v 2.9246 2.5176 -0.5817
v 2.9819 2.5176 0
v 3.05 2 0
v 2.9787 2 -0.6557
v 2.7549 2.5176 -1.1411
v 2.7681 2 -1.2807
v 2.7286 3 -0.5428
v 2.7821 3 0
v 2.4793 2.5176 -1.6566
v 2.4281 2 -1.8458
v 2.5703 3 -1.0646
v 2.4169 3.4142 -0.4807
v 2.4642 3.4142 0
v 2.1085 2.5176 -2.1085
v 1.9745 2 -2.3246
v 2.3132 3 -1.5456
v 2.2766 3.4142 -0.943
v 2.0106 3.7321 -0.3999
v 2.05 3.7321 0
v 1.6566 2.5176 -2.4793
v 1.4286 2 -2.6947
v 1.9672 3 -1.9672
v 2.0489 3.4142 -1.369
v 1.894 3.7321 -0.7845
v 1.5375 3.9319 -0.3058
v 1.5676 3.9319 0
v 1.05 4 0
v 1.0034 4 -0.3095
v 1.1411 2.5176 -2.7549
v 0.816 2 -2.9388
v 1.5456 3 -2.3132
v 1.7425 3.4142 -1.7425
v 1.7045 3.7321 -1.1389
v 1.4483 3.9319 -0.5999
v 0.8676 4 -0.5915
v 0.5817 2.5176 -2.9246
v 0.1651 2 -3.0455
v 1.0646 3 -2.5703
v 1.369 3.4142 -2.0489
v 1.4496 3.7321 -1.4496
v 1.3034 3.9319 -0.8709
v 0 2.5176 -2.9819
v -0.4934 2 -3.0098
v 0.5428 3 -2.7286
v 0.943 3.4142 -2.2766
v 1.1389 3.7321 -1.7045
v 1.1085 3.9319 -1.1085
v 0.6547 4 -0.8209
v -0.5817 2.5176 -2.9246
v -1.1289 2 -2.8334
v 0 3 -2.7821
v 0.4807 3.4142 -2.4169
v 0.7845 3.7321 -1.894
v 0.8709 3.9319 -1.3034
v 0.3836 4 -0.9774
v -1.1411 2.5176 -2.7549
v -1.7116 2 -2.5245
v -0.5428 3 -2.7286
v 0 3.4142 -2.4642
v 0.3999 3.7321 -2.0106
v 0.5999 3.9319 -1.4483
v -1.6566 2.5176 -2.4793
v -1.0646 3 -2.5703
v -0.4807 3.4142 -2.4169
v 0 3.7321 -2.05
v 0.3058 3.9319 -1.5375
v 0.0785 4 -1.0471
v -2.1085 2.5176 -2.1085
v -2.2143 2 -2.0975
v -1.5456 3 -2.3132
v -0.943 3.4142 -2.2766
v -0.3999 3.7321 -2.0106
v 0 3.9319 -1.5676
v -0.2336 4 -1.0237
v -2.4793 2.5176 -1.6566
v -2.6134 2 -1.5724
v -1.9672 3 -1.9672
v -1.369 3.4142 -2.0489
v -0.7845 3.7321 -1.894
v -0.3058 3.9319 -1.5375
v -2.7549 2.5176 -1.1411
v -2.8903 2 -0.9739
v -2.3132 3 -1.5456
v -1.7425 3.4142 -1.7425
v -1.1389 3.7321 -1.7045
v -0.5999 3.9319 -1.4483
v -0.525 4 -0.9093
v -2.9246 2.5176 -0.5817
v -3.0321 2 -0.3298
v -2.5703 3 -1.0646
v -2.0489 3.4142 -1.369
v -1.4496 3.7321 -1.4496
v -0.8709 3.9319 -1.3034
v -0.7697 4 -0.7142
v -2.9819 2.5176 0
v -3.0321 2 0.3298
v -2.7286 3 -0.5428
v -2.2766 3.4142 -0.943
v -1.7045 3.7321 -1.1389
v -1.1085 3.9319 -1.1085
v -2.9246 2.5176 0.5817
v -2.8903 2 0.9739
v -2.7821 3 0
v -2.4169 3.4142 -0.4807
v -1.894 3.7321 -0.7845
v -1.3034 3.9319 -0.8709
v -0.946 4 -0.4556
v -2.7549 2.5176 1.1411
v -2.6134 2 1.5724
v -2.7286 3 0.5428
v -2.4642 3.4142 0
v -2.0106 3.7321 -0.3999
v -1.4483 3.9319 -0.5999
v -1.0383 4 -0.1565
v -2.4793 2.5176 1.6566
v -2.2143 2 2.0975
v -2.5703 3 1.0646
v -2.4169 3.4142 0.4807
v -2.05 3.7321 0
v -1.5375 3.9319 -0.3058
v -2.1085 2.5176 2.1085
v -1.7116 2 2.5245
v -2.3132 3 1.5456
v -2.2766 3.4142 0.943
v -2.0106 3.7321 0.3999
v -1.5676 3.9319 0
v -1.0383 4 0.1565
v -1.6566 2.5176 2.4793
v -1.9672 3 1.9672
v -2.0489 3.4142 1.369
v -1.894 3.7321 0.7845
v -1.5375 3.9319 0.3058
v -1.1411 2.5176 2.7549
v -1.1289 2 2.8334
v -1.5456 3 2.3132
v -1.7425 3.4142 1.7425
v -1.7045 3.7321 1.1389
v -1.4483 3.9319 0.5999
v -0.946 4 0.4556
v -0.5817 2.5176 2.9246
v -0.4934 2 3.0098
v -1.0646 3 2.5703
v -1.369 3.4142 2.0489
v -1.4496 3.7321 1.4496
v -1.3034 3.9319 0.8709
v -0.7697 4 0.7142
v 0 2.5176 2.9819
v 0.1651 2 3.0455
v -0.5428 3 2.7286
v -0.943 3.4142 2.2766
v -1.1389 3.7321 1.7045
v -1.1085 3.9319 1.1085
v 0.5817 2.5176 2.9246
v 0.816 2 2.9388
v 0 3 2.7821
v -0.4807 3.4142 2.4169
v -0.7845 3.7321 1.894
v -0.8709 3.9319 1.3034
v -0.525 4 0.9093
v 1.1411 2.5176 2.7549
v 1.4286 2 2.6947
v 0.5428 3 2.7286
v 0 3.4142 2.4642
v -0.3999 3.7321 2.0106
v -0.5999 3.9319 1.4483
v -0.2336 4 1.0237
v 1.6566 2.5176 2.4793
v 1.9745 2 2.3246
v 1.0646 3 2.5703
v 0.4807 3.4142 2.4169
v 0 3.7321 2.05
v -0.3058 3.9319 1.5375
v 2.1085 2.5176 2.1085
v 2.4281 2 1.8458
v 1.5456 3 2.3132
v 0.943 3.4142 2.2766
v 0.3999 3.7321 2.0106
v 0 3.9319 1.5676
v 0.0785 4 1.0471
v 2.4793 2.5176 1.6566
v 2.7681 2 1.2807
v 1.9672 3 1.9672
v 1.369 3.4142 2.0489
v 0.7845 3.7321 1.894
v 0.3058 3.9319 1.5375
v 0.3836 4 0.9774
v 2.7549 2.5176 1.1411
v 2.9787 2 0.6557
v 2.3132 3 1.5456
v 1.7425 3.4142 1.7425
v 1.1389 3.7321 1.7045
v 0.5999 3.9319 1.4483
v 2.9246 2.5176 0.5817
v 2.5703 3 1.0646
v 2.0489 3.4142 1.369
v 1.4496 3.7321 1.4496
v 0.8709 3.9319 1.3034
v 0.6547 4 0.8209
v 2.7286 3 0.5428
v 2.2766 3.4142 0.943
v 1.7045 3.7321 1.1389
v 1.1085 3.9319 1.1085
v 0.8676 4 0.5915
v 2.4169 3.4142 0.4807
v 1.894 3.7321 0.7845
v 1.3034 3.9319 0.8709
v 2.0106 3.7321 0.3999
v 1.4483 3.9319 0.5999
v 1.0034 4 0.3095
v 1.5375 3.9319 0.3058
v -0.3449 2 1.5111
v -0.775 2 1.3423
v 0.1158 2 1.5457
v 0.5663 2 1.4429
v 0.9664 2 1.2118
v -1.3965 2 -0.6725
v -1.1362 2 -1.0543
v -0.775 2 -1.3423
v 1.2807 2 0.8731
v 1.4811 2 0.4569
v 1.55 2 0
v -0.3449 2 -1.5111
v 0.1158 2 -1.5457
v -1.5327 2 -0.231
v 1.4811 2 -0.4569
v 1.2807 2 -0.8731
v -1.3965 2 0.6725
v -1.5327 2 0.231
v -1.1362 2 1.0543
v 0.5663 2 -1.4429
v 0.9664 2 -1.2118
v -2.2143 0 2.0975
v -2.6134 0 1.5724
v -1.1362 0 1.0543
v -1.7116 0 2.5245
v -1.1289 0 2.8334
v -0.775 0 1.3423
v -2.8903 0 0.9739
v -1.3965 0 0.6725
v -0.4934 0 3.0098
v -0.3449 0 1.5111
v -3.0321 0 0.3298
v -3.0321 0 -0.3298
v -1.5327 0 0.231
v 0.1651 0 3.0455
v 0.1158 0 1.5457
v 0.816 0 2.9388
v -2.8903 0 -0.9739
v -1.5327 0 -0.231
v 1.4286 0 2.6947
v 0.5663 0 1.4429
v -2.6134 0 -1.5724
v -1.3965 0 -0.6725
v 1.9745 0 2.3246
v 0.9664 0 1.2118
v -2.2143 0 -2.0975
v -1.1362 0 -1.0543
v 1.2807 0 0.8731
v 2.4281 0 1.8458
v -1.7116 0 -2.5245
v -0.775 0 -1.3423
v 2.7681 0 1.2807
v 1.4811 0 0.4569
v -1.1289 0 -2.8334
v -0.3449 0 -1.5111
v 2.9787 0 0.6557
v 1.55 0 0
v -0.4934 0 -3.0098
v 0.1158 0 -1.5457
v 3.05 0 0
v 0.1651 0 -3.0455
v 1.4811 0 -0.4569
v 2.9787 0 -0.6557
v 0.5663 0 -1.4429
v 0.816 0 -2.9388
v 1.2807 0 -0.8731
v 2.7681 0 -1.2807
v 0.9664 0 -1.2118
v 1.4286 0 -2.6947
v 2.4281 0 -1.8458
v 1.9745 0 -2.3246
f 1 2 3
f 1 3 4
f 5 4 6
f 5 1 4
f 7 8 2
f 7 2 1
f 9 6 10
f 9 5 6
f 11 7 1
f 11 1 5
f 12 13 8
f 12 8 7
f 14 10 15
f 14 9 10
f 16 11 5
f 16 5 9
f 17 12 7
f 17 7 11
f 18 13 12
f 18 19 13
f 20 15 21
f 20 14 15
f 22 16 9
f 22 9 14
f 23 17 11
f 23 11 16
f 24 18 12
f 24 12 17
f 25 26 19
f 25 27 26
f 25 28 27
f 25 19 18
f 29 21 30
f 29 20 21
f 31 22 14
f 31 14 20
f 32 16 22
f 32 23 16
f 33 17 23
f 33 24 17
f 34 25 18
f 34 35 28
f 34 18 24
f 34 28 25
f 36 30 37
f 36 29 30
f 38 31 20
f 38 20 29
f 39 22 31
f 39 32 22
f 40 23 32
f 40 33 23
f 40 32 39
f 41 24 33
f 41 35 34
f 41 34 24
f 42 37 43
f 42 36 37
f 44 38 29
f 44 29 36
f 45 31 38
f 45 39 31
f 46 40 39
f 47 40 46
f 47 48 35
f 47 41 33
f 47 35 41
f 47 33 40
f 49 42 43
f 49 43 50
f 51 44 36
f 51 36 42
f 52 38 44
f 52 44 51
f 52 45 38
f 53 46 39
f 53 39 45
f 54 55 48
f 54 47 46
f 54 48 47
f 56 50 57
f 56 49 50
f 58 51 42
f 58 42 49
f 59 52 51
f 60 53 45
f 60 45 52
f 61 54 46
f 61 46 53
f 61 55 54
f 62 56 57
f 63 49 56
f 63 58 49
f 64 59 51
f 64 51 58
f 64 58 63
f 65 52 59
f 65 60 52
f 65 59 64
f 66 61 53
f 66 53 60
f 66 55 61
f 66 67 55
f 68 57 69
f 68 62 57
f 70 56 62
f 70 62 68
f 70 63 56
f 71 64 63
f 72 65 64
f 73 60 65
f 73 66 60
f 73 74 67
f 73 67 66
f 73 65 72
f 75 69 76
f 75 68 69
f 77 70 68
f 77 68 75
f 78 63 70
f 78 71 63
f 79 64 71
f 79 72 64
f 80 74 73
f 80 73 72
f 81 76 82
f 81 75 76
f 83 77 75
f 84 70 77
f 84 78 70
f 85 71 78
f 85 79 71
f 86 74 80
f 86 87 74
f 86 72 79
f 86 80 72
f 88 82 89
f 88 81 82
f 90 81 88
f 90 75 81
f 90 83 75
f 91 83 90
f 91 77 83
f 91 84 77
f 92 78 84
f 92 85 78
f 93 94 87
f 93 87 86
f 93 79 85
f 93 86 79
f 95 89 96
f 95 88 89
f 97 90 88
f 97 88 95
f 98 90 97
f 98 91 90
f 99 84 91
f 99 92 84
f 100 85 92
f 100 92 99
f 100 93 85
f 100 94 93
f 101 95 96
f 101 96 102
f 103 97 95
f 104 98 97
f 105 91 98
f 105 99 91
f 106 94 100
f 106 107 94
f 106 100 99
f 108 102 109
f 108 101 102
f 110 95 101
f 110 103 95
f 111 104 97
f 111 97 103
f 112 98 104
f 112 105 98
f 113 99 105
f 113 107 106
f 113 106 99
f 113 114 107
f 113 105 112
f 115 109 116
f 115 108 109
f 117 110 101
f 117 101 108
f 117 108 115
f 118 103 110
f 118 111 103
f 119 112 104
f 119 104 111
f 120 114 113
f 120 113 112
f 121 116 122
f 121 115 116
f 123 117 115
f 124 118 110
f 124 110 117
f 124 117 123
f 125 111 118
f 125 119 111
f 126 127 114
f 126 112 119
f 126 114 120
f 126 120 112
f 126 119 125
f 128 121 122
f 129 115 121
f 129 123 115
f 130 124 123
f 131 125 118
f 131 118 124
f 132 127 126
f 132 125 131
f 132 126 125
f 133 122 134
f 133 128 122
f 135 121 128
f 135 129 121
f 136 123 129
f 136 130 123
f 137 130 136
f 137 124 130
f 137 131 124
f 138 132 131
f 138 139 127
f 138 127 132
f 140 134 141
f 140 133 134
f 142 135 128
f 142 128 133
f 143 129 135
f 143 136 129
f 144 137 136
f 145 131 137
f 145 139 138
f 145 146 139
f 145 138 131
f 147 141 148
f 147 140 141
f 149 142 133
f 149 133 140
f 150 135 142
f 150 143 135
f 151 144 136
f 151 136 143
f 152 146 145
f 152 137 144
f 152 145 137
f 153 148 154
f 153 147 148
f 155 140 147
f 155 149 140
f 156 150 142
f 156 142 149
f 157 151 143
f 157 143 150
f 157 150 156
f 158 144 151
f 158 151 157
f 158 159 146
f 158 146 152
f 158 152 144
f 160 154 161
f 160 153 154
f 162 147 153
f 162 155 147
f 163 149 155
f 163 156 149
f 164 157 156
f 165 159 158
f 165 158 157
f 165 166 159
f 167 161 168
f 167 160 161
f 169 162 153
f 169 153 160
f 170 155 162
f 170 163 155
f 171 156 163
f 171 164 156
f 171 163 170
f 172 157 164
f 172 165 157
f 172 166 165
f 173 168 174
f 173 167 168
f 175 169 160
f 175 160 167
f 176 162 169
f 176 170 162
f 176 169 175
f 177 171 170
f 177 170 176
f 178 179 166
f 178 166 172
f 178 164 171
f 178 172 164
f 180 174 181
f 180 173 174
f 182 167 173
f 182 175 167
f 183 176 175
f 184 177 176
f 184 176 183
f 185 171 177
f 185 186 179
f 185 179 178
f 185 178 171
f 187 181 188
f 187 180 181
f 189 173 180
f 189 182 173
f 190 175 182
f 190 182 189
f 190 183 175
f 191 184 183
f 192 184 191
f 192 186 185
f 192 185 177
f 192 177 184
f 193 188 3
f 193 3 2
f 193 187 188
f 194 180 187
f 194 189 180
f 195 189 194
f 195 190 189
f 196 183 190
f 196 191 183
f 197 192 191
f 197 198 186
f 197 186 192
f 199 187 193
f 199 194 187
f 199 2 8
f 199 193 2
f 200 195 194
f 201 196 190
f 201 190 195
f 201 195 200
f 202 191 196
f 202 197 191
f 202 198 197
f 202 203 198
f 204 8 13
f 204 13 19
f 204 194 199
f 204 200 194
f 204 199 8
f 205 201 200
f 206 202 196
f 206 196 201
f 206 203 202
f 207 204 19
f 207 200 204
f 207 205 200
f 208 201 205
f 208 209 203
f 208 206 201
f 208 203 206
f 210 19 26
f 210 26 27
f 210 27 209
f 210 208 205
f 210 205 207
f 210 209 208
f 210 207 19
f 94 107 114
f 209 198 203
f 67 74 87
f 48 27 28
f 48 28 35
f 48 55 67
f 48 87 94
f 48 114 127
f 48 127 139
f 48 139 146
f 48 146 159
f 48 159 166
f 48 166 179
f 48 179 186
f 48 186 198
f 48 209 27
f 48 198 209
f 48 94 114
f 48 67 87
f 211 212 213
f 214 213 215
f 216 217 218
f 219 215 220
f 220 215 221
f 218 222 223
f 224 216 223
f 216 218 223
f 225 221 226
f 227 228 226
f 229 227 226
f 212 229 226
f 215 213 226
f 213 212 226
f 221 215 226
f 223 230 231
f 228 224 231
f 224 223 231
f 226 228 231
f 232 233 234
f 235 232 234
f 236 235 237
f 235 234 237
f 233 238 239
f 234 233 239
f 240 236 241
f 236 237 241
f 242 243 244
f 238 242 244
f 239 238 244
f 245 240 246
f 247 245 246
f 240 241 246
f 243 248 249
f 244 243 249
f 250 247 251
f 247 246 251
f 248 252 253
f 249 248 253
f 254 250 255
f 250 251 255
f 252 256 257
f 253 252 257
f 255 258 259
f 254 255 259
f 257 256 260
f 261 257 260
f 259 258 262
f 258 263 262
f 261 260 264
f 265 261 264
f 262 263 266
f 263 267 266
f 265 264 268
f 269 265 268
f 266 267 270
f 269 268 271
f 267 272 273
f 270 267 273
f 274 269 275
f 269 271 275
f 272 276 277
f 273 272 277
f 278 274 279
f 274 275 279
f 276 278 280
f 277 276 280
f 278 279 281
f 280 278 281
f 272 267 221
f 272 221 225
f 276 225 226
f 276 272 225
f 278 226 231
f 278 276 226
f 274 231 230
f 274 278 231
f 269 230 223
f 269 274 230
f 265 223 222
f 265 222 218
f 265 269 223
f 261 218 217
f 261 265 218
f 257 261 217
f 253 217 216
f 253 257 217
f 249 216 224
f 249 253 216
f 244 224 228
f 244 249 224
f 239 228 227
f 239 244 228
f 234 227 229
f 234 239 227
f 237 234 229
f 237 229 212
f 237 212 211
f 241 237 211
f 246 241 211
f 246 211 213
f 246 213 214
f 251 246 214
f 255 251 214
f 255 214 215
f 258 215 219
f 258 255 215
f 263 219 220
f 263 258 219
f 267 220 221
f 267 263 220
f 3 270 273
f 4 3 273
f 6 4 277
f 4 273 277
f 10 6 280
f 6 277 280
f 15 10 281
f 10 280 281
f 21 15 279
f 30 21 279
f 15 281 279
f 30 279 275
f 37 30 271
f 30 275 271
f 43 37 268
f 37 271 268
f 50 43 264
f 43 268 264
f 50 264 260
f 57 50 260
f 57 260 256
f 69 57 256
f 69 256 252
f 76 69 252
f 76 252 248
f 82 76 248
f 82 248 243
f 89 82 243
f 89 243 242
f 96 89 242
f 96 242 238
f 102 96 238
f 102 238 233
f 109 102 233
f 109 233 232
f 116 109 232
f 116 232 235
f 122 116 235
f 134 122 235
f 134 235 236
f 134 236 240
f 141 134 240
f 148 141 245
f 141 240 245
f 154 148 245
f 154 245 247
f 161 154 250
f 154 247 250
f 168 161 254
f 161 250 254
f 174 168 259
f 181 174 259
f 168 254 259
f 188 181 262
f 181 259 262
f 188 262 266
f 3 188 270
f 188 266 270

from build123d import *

# Parameters (mm, degrees)
SKETCH1_R           = 3.05
SKETCH1_R_2         = 1.55
BOSS_EXTRUDE1_DEPTH = 2
SKETCH3_R           = 3.05
BOSS_EXTRUDE2_DEPTH = 2
FILLET1_R           = 2


with BuildPart() as part:
    # Sketch1 → Boss-Extrude1 (new body)
    with BuildSketch(Plane(origin=(0, 0, 0), x_dir=(1, 0, 0), z_dir=(0, 1, 0))):
        Circle(SKETCH1_R)
        Circle(SKETCH1_R_2, mode=Mode.SUBTRACT)
    extrude(amount=BOSS_EXTRUDE1_DEPTH)

    # Sketch3 → Boss-Extrude2 (add)
    with BuildSketch(Plane(origin=(0, 2, 0), x_dir=(1, 0, 0), z_dir=(0, 1, 0))):
        Circle(SKETCH3_R)
    extrude(amount=BOSS_EXTRUDE2_DEPTH)

    # Fillet1
    fillet1_edges = [part.edges().sort_by_distance(p)[0] for p in [
        (-3.05, 4, 0),
    ]]
    fillet(fillet1_edges, radius=FILLET1_R)


solid = part.part
